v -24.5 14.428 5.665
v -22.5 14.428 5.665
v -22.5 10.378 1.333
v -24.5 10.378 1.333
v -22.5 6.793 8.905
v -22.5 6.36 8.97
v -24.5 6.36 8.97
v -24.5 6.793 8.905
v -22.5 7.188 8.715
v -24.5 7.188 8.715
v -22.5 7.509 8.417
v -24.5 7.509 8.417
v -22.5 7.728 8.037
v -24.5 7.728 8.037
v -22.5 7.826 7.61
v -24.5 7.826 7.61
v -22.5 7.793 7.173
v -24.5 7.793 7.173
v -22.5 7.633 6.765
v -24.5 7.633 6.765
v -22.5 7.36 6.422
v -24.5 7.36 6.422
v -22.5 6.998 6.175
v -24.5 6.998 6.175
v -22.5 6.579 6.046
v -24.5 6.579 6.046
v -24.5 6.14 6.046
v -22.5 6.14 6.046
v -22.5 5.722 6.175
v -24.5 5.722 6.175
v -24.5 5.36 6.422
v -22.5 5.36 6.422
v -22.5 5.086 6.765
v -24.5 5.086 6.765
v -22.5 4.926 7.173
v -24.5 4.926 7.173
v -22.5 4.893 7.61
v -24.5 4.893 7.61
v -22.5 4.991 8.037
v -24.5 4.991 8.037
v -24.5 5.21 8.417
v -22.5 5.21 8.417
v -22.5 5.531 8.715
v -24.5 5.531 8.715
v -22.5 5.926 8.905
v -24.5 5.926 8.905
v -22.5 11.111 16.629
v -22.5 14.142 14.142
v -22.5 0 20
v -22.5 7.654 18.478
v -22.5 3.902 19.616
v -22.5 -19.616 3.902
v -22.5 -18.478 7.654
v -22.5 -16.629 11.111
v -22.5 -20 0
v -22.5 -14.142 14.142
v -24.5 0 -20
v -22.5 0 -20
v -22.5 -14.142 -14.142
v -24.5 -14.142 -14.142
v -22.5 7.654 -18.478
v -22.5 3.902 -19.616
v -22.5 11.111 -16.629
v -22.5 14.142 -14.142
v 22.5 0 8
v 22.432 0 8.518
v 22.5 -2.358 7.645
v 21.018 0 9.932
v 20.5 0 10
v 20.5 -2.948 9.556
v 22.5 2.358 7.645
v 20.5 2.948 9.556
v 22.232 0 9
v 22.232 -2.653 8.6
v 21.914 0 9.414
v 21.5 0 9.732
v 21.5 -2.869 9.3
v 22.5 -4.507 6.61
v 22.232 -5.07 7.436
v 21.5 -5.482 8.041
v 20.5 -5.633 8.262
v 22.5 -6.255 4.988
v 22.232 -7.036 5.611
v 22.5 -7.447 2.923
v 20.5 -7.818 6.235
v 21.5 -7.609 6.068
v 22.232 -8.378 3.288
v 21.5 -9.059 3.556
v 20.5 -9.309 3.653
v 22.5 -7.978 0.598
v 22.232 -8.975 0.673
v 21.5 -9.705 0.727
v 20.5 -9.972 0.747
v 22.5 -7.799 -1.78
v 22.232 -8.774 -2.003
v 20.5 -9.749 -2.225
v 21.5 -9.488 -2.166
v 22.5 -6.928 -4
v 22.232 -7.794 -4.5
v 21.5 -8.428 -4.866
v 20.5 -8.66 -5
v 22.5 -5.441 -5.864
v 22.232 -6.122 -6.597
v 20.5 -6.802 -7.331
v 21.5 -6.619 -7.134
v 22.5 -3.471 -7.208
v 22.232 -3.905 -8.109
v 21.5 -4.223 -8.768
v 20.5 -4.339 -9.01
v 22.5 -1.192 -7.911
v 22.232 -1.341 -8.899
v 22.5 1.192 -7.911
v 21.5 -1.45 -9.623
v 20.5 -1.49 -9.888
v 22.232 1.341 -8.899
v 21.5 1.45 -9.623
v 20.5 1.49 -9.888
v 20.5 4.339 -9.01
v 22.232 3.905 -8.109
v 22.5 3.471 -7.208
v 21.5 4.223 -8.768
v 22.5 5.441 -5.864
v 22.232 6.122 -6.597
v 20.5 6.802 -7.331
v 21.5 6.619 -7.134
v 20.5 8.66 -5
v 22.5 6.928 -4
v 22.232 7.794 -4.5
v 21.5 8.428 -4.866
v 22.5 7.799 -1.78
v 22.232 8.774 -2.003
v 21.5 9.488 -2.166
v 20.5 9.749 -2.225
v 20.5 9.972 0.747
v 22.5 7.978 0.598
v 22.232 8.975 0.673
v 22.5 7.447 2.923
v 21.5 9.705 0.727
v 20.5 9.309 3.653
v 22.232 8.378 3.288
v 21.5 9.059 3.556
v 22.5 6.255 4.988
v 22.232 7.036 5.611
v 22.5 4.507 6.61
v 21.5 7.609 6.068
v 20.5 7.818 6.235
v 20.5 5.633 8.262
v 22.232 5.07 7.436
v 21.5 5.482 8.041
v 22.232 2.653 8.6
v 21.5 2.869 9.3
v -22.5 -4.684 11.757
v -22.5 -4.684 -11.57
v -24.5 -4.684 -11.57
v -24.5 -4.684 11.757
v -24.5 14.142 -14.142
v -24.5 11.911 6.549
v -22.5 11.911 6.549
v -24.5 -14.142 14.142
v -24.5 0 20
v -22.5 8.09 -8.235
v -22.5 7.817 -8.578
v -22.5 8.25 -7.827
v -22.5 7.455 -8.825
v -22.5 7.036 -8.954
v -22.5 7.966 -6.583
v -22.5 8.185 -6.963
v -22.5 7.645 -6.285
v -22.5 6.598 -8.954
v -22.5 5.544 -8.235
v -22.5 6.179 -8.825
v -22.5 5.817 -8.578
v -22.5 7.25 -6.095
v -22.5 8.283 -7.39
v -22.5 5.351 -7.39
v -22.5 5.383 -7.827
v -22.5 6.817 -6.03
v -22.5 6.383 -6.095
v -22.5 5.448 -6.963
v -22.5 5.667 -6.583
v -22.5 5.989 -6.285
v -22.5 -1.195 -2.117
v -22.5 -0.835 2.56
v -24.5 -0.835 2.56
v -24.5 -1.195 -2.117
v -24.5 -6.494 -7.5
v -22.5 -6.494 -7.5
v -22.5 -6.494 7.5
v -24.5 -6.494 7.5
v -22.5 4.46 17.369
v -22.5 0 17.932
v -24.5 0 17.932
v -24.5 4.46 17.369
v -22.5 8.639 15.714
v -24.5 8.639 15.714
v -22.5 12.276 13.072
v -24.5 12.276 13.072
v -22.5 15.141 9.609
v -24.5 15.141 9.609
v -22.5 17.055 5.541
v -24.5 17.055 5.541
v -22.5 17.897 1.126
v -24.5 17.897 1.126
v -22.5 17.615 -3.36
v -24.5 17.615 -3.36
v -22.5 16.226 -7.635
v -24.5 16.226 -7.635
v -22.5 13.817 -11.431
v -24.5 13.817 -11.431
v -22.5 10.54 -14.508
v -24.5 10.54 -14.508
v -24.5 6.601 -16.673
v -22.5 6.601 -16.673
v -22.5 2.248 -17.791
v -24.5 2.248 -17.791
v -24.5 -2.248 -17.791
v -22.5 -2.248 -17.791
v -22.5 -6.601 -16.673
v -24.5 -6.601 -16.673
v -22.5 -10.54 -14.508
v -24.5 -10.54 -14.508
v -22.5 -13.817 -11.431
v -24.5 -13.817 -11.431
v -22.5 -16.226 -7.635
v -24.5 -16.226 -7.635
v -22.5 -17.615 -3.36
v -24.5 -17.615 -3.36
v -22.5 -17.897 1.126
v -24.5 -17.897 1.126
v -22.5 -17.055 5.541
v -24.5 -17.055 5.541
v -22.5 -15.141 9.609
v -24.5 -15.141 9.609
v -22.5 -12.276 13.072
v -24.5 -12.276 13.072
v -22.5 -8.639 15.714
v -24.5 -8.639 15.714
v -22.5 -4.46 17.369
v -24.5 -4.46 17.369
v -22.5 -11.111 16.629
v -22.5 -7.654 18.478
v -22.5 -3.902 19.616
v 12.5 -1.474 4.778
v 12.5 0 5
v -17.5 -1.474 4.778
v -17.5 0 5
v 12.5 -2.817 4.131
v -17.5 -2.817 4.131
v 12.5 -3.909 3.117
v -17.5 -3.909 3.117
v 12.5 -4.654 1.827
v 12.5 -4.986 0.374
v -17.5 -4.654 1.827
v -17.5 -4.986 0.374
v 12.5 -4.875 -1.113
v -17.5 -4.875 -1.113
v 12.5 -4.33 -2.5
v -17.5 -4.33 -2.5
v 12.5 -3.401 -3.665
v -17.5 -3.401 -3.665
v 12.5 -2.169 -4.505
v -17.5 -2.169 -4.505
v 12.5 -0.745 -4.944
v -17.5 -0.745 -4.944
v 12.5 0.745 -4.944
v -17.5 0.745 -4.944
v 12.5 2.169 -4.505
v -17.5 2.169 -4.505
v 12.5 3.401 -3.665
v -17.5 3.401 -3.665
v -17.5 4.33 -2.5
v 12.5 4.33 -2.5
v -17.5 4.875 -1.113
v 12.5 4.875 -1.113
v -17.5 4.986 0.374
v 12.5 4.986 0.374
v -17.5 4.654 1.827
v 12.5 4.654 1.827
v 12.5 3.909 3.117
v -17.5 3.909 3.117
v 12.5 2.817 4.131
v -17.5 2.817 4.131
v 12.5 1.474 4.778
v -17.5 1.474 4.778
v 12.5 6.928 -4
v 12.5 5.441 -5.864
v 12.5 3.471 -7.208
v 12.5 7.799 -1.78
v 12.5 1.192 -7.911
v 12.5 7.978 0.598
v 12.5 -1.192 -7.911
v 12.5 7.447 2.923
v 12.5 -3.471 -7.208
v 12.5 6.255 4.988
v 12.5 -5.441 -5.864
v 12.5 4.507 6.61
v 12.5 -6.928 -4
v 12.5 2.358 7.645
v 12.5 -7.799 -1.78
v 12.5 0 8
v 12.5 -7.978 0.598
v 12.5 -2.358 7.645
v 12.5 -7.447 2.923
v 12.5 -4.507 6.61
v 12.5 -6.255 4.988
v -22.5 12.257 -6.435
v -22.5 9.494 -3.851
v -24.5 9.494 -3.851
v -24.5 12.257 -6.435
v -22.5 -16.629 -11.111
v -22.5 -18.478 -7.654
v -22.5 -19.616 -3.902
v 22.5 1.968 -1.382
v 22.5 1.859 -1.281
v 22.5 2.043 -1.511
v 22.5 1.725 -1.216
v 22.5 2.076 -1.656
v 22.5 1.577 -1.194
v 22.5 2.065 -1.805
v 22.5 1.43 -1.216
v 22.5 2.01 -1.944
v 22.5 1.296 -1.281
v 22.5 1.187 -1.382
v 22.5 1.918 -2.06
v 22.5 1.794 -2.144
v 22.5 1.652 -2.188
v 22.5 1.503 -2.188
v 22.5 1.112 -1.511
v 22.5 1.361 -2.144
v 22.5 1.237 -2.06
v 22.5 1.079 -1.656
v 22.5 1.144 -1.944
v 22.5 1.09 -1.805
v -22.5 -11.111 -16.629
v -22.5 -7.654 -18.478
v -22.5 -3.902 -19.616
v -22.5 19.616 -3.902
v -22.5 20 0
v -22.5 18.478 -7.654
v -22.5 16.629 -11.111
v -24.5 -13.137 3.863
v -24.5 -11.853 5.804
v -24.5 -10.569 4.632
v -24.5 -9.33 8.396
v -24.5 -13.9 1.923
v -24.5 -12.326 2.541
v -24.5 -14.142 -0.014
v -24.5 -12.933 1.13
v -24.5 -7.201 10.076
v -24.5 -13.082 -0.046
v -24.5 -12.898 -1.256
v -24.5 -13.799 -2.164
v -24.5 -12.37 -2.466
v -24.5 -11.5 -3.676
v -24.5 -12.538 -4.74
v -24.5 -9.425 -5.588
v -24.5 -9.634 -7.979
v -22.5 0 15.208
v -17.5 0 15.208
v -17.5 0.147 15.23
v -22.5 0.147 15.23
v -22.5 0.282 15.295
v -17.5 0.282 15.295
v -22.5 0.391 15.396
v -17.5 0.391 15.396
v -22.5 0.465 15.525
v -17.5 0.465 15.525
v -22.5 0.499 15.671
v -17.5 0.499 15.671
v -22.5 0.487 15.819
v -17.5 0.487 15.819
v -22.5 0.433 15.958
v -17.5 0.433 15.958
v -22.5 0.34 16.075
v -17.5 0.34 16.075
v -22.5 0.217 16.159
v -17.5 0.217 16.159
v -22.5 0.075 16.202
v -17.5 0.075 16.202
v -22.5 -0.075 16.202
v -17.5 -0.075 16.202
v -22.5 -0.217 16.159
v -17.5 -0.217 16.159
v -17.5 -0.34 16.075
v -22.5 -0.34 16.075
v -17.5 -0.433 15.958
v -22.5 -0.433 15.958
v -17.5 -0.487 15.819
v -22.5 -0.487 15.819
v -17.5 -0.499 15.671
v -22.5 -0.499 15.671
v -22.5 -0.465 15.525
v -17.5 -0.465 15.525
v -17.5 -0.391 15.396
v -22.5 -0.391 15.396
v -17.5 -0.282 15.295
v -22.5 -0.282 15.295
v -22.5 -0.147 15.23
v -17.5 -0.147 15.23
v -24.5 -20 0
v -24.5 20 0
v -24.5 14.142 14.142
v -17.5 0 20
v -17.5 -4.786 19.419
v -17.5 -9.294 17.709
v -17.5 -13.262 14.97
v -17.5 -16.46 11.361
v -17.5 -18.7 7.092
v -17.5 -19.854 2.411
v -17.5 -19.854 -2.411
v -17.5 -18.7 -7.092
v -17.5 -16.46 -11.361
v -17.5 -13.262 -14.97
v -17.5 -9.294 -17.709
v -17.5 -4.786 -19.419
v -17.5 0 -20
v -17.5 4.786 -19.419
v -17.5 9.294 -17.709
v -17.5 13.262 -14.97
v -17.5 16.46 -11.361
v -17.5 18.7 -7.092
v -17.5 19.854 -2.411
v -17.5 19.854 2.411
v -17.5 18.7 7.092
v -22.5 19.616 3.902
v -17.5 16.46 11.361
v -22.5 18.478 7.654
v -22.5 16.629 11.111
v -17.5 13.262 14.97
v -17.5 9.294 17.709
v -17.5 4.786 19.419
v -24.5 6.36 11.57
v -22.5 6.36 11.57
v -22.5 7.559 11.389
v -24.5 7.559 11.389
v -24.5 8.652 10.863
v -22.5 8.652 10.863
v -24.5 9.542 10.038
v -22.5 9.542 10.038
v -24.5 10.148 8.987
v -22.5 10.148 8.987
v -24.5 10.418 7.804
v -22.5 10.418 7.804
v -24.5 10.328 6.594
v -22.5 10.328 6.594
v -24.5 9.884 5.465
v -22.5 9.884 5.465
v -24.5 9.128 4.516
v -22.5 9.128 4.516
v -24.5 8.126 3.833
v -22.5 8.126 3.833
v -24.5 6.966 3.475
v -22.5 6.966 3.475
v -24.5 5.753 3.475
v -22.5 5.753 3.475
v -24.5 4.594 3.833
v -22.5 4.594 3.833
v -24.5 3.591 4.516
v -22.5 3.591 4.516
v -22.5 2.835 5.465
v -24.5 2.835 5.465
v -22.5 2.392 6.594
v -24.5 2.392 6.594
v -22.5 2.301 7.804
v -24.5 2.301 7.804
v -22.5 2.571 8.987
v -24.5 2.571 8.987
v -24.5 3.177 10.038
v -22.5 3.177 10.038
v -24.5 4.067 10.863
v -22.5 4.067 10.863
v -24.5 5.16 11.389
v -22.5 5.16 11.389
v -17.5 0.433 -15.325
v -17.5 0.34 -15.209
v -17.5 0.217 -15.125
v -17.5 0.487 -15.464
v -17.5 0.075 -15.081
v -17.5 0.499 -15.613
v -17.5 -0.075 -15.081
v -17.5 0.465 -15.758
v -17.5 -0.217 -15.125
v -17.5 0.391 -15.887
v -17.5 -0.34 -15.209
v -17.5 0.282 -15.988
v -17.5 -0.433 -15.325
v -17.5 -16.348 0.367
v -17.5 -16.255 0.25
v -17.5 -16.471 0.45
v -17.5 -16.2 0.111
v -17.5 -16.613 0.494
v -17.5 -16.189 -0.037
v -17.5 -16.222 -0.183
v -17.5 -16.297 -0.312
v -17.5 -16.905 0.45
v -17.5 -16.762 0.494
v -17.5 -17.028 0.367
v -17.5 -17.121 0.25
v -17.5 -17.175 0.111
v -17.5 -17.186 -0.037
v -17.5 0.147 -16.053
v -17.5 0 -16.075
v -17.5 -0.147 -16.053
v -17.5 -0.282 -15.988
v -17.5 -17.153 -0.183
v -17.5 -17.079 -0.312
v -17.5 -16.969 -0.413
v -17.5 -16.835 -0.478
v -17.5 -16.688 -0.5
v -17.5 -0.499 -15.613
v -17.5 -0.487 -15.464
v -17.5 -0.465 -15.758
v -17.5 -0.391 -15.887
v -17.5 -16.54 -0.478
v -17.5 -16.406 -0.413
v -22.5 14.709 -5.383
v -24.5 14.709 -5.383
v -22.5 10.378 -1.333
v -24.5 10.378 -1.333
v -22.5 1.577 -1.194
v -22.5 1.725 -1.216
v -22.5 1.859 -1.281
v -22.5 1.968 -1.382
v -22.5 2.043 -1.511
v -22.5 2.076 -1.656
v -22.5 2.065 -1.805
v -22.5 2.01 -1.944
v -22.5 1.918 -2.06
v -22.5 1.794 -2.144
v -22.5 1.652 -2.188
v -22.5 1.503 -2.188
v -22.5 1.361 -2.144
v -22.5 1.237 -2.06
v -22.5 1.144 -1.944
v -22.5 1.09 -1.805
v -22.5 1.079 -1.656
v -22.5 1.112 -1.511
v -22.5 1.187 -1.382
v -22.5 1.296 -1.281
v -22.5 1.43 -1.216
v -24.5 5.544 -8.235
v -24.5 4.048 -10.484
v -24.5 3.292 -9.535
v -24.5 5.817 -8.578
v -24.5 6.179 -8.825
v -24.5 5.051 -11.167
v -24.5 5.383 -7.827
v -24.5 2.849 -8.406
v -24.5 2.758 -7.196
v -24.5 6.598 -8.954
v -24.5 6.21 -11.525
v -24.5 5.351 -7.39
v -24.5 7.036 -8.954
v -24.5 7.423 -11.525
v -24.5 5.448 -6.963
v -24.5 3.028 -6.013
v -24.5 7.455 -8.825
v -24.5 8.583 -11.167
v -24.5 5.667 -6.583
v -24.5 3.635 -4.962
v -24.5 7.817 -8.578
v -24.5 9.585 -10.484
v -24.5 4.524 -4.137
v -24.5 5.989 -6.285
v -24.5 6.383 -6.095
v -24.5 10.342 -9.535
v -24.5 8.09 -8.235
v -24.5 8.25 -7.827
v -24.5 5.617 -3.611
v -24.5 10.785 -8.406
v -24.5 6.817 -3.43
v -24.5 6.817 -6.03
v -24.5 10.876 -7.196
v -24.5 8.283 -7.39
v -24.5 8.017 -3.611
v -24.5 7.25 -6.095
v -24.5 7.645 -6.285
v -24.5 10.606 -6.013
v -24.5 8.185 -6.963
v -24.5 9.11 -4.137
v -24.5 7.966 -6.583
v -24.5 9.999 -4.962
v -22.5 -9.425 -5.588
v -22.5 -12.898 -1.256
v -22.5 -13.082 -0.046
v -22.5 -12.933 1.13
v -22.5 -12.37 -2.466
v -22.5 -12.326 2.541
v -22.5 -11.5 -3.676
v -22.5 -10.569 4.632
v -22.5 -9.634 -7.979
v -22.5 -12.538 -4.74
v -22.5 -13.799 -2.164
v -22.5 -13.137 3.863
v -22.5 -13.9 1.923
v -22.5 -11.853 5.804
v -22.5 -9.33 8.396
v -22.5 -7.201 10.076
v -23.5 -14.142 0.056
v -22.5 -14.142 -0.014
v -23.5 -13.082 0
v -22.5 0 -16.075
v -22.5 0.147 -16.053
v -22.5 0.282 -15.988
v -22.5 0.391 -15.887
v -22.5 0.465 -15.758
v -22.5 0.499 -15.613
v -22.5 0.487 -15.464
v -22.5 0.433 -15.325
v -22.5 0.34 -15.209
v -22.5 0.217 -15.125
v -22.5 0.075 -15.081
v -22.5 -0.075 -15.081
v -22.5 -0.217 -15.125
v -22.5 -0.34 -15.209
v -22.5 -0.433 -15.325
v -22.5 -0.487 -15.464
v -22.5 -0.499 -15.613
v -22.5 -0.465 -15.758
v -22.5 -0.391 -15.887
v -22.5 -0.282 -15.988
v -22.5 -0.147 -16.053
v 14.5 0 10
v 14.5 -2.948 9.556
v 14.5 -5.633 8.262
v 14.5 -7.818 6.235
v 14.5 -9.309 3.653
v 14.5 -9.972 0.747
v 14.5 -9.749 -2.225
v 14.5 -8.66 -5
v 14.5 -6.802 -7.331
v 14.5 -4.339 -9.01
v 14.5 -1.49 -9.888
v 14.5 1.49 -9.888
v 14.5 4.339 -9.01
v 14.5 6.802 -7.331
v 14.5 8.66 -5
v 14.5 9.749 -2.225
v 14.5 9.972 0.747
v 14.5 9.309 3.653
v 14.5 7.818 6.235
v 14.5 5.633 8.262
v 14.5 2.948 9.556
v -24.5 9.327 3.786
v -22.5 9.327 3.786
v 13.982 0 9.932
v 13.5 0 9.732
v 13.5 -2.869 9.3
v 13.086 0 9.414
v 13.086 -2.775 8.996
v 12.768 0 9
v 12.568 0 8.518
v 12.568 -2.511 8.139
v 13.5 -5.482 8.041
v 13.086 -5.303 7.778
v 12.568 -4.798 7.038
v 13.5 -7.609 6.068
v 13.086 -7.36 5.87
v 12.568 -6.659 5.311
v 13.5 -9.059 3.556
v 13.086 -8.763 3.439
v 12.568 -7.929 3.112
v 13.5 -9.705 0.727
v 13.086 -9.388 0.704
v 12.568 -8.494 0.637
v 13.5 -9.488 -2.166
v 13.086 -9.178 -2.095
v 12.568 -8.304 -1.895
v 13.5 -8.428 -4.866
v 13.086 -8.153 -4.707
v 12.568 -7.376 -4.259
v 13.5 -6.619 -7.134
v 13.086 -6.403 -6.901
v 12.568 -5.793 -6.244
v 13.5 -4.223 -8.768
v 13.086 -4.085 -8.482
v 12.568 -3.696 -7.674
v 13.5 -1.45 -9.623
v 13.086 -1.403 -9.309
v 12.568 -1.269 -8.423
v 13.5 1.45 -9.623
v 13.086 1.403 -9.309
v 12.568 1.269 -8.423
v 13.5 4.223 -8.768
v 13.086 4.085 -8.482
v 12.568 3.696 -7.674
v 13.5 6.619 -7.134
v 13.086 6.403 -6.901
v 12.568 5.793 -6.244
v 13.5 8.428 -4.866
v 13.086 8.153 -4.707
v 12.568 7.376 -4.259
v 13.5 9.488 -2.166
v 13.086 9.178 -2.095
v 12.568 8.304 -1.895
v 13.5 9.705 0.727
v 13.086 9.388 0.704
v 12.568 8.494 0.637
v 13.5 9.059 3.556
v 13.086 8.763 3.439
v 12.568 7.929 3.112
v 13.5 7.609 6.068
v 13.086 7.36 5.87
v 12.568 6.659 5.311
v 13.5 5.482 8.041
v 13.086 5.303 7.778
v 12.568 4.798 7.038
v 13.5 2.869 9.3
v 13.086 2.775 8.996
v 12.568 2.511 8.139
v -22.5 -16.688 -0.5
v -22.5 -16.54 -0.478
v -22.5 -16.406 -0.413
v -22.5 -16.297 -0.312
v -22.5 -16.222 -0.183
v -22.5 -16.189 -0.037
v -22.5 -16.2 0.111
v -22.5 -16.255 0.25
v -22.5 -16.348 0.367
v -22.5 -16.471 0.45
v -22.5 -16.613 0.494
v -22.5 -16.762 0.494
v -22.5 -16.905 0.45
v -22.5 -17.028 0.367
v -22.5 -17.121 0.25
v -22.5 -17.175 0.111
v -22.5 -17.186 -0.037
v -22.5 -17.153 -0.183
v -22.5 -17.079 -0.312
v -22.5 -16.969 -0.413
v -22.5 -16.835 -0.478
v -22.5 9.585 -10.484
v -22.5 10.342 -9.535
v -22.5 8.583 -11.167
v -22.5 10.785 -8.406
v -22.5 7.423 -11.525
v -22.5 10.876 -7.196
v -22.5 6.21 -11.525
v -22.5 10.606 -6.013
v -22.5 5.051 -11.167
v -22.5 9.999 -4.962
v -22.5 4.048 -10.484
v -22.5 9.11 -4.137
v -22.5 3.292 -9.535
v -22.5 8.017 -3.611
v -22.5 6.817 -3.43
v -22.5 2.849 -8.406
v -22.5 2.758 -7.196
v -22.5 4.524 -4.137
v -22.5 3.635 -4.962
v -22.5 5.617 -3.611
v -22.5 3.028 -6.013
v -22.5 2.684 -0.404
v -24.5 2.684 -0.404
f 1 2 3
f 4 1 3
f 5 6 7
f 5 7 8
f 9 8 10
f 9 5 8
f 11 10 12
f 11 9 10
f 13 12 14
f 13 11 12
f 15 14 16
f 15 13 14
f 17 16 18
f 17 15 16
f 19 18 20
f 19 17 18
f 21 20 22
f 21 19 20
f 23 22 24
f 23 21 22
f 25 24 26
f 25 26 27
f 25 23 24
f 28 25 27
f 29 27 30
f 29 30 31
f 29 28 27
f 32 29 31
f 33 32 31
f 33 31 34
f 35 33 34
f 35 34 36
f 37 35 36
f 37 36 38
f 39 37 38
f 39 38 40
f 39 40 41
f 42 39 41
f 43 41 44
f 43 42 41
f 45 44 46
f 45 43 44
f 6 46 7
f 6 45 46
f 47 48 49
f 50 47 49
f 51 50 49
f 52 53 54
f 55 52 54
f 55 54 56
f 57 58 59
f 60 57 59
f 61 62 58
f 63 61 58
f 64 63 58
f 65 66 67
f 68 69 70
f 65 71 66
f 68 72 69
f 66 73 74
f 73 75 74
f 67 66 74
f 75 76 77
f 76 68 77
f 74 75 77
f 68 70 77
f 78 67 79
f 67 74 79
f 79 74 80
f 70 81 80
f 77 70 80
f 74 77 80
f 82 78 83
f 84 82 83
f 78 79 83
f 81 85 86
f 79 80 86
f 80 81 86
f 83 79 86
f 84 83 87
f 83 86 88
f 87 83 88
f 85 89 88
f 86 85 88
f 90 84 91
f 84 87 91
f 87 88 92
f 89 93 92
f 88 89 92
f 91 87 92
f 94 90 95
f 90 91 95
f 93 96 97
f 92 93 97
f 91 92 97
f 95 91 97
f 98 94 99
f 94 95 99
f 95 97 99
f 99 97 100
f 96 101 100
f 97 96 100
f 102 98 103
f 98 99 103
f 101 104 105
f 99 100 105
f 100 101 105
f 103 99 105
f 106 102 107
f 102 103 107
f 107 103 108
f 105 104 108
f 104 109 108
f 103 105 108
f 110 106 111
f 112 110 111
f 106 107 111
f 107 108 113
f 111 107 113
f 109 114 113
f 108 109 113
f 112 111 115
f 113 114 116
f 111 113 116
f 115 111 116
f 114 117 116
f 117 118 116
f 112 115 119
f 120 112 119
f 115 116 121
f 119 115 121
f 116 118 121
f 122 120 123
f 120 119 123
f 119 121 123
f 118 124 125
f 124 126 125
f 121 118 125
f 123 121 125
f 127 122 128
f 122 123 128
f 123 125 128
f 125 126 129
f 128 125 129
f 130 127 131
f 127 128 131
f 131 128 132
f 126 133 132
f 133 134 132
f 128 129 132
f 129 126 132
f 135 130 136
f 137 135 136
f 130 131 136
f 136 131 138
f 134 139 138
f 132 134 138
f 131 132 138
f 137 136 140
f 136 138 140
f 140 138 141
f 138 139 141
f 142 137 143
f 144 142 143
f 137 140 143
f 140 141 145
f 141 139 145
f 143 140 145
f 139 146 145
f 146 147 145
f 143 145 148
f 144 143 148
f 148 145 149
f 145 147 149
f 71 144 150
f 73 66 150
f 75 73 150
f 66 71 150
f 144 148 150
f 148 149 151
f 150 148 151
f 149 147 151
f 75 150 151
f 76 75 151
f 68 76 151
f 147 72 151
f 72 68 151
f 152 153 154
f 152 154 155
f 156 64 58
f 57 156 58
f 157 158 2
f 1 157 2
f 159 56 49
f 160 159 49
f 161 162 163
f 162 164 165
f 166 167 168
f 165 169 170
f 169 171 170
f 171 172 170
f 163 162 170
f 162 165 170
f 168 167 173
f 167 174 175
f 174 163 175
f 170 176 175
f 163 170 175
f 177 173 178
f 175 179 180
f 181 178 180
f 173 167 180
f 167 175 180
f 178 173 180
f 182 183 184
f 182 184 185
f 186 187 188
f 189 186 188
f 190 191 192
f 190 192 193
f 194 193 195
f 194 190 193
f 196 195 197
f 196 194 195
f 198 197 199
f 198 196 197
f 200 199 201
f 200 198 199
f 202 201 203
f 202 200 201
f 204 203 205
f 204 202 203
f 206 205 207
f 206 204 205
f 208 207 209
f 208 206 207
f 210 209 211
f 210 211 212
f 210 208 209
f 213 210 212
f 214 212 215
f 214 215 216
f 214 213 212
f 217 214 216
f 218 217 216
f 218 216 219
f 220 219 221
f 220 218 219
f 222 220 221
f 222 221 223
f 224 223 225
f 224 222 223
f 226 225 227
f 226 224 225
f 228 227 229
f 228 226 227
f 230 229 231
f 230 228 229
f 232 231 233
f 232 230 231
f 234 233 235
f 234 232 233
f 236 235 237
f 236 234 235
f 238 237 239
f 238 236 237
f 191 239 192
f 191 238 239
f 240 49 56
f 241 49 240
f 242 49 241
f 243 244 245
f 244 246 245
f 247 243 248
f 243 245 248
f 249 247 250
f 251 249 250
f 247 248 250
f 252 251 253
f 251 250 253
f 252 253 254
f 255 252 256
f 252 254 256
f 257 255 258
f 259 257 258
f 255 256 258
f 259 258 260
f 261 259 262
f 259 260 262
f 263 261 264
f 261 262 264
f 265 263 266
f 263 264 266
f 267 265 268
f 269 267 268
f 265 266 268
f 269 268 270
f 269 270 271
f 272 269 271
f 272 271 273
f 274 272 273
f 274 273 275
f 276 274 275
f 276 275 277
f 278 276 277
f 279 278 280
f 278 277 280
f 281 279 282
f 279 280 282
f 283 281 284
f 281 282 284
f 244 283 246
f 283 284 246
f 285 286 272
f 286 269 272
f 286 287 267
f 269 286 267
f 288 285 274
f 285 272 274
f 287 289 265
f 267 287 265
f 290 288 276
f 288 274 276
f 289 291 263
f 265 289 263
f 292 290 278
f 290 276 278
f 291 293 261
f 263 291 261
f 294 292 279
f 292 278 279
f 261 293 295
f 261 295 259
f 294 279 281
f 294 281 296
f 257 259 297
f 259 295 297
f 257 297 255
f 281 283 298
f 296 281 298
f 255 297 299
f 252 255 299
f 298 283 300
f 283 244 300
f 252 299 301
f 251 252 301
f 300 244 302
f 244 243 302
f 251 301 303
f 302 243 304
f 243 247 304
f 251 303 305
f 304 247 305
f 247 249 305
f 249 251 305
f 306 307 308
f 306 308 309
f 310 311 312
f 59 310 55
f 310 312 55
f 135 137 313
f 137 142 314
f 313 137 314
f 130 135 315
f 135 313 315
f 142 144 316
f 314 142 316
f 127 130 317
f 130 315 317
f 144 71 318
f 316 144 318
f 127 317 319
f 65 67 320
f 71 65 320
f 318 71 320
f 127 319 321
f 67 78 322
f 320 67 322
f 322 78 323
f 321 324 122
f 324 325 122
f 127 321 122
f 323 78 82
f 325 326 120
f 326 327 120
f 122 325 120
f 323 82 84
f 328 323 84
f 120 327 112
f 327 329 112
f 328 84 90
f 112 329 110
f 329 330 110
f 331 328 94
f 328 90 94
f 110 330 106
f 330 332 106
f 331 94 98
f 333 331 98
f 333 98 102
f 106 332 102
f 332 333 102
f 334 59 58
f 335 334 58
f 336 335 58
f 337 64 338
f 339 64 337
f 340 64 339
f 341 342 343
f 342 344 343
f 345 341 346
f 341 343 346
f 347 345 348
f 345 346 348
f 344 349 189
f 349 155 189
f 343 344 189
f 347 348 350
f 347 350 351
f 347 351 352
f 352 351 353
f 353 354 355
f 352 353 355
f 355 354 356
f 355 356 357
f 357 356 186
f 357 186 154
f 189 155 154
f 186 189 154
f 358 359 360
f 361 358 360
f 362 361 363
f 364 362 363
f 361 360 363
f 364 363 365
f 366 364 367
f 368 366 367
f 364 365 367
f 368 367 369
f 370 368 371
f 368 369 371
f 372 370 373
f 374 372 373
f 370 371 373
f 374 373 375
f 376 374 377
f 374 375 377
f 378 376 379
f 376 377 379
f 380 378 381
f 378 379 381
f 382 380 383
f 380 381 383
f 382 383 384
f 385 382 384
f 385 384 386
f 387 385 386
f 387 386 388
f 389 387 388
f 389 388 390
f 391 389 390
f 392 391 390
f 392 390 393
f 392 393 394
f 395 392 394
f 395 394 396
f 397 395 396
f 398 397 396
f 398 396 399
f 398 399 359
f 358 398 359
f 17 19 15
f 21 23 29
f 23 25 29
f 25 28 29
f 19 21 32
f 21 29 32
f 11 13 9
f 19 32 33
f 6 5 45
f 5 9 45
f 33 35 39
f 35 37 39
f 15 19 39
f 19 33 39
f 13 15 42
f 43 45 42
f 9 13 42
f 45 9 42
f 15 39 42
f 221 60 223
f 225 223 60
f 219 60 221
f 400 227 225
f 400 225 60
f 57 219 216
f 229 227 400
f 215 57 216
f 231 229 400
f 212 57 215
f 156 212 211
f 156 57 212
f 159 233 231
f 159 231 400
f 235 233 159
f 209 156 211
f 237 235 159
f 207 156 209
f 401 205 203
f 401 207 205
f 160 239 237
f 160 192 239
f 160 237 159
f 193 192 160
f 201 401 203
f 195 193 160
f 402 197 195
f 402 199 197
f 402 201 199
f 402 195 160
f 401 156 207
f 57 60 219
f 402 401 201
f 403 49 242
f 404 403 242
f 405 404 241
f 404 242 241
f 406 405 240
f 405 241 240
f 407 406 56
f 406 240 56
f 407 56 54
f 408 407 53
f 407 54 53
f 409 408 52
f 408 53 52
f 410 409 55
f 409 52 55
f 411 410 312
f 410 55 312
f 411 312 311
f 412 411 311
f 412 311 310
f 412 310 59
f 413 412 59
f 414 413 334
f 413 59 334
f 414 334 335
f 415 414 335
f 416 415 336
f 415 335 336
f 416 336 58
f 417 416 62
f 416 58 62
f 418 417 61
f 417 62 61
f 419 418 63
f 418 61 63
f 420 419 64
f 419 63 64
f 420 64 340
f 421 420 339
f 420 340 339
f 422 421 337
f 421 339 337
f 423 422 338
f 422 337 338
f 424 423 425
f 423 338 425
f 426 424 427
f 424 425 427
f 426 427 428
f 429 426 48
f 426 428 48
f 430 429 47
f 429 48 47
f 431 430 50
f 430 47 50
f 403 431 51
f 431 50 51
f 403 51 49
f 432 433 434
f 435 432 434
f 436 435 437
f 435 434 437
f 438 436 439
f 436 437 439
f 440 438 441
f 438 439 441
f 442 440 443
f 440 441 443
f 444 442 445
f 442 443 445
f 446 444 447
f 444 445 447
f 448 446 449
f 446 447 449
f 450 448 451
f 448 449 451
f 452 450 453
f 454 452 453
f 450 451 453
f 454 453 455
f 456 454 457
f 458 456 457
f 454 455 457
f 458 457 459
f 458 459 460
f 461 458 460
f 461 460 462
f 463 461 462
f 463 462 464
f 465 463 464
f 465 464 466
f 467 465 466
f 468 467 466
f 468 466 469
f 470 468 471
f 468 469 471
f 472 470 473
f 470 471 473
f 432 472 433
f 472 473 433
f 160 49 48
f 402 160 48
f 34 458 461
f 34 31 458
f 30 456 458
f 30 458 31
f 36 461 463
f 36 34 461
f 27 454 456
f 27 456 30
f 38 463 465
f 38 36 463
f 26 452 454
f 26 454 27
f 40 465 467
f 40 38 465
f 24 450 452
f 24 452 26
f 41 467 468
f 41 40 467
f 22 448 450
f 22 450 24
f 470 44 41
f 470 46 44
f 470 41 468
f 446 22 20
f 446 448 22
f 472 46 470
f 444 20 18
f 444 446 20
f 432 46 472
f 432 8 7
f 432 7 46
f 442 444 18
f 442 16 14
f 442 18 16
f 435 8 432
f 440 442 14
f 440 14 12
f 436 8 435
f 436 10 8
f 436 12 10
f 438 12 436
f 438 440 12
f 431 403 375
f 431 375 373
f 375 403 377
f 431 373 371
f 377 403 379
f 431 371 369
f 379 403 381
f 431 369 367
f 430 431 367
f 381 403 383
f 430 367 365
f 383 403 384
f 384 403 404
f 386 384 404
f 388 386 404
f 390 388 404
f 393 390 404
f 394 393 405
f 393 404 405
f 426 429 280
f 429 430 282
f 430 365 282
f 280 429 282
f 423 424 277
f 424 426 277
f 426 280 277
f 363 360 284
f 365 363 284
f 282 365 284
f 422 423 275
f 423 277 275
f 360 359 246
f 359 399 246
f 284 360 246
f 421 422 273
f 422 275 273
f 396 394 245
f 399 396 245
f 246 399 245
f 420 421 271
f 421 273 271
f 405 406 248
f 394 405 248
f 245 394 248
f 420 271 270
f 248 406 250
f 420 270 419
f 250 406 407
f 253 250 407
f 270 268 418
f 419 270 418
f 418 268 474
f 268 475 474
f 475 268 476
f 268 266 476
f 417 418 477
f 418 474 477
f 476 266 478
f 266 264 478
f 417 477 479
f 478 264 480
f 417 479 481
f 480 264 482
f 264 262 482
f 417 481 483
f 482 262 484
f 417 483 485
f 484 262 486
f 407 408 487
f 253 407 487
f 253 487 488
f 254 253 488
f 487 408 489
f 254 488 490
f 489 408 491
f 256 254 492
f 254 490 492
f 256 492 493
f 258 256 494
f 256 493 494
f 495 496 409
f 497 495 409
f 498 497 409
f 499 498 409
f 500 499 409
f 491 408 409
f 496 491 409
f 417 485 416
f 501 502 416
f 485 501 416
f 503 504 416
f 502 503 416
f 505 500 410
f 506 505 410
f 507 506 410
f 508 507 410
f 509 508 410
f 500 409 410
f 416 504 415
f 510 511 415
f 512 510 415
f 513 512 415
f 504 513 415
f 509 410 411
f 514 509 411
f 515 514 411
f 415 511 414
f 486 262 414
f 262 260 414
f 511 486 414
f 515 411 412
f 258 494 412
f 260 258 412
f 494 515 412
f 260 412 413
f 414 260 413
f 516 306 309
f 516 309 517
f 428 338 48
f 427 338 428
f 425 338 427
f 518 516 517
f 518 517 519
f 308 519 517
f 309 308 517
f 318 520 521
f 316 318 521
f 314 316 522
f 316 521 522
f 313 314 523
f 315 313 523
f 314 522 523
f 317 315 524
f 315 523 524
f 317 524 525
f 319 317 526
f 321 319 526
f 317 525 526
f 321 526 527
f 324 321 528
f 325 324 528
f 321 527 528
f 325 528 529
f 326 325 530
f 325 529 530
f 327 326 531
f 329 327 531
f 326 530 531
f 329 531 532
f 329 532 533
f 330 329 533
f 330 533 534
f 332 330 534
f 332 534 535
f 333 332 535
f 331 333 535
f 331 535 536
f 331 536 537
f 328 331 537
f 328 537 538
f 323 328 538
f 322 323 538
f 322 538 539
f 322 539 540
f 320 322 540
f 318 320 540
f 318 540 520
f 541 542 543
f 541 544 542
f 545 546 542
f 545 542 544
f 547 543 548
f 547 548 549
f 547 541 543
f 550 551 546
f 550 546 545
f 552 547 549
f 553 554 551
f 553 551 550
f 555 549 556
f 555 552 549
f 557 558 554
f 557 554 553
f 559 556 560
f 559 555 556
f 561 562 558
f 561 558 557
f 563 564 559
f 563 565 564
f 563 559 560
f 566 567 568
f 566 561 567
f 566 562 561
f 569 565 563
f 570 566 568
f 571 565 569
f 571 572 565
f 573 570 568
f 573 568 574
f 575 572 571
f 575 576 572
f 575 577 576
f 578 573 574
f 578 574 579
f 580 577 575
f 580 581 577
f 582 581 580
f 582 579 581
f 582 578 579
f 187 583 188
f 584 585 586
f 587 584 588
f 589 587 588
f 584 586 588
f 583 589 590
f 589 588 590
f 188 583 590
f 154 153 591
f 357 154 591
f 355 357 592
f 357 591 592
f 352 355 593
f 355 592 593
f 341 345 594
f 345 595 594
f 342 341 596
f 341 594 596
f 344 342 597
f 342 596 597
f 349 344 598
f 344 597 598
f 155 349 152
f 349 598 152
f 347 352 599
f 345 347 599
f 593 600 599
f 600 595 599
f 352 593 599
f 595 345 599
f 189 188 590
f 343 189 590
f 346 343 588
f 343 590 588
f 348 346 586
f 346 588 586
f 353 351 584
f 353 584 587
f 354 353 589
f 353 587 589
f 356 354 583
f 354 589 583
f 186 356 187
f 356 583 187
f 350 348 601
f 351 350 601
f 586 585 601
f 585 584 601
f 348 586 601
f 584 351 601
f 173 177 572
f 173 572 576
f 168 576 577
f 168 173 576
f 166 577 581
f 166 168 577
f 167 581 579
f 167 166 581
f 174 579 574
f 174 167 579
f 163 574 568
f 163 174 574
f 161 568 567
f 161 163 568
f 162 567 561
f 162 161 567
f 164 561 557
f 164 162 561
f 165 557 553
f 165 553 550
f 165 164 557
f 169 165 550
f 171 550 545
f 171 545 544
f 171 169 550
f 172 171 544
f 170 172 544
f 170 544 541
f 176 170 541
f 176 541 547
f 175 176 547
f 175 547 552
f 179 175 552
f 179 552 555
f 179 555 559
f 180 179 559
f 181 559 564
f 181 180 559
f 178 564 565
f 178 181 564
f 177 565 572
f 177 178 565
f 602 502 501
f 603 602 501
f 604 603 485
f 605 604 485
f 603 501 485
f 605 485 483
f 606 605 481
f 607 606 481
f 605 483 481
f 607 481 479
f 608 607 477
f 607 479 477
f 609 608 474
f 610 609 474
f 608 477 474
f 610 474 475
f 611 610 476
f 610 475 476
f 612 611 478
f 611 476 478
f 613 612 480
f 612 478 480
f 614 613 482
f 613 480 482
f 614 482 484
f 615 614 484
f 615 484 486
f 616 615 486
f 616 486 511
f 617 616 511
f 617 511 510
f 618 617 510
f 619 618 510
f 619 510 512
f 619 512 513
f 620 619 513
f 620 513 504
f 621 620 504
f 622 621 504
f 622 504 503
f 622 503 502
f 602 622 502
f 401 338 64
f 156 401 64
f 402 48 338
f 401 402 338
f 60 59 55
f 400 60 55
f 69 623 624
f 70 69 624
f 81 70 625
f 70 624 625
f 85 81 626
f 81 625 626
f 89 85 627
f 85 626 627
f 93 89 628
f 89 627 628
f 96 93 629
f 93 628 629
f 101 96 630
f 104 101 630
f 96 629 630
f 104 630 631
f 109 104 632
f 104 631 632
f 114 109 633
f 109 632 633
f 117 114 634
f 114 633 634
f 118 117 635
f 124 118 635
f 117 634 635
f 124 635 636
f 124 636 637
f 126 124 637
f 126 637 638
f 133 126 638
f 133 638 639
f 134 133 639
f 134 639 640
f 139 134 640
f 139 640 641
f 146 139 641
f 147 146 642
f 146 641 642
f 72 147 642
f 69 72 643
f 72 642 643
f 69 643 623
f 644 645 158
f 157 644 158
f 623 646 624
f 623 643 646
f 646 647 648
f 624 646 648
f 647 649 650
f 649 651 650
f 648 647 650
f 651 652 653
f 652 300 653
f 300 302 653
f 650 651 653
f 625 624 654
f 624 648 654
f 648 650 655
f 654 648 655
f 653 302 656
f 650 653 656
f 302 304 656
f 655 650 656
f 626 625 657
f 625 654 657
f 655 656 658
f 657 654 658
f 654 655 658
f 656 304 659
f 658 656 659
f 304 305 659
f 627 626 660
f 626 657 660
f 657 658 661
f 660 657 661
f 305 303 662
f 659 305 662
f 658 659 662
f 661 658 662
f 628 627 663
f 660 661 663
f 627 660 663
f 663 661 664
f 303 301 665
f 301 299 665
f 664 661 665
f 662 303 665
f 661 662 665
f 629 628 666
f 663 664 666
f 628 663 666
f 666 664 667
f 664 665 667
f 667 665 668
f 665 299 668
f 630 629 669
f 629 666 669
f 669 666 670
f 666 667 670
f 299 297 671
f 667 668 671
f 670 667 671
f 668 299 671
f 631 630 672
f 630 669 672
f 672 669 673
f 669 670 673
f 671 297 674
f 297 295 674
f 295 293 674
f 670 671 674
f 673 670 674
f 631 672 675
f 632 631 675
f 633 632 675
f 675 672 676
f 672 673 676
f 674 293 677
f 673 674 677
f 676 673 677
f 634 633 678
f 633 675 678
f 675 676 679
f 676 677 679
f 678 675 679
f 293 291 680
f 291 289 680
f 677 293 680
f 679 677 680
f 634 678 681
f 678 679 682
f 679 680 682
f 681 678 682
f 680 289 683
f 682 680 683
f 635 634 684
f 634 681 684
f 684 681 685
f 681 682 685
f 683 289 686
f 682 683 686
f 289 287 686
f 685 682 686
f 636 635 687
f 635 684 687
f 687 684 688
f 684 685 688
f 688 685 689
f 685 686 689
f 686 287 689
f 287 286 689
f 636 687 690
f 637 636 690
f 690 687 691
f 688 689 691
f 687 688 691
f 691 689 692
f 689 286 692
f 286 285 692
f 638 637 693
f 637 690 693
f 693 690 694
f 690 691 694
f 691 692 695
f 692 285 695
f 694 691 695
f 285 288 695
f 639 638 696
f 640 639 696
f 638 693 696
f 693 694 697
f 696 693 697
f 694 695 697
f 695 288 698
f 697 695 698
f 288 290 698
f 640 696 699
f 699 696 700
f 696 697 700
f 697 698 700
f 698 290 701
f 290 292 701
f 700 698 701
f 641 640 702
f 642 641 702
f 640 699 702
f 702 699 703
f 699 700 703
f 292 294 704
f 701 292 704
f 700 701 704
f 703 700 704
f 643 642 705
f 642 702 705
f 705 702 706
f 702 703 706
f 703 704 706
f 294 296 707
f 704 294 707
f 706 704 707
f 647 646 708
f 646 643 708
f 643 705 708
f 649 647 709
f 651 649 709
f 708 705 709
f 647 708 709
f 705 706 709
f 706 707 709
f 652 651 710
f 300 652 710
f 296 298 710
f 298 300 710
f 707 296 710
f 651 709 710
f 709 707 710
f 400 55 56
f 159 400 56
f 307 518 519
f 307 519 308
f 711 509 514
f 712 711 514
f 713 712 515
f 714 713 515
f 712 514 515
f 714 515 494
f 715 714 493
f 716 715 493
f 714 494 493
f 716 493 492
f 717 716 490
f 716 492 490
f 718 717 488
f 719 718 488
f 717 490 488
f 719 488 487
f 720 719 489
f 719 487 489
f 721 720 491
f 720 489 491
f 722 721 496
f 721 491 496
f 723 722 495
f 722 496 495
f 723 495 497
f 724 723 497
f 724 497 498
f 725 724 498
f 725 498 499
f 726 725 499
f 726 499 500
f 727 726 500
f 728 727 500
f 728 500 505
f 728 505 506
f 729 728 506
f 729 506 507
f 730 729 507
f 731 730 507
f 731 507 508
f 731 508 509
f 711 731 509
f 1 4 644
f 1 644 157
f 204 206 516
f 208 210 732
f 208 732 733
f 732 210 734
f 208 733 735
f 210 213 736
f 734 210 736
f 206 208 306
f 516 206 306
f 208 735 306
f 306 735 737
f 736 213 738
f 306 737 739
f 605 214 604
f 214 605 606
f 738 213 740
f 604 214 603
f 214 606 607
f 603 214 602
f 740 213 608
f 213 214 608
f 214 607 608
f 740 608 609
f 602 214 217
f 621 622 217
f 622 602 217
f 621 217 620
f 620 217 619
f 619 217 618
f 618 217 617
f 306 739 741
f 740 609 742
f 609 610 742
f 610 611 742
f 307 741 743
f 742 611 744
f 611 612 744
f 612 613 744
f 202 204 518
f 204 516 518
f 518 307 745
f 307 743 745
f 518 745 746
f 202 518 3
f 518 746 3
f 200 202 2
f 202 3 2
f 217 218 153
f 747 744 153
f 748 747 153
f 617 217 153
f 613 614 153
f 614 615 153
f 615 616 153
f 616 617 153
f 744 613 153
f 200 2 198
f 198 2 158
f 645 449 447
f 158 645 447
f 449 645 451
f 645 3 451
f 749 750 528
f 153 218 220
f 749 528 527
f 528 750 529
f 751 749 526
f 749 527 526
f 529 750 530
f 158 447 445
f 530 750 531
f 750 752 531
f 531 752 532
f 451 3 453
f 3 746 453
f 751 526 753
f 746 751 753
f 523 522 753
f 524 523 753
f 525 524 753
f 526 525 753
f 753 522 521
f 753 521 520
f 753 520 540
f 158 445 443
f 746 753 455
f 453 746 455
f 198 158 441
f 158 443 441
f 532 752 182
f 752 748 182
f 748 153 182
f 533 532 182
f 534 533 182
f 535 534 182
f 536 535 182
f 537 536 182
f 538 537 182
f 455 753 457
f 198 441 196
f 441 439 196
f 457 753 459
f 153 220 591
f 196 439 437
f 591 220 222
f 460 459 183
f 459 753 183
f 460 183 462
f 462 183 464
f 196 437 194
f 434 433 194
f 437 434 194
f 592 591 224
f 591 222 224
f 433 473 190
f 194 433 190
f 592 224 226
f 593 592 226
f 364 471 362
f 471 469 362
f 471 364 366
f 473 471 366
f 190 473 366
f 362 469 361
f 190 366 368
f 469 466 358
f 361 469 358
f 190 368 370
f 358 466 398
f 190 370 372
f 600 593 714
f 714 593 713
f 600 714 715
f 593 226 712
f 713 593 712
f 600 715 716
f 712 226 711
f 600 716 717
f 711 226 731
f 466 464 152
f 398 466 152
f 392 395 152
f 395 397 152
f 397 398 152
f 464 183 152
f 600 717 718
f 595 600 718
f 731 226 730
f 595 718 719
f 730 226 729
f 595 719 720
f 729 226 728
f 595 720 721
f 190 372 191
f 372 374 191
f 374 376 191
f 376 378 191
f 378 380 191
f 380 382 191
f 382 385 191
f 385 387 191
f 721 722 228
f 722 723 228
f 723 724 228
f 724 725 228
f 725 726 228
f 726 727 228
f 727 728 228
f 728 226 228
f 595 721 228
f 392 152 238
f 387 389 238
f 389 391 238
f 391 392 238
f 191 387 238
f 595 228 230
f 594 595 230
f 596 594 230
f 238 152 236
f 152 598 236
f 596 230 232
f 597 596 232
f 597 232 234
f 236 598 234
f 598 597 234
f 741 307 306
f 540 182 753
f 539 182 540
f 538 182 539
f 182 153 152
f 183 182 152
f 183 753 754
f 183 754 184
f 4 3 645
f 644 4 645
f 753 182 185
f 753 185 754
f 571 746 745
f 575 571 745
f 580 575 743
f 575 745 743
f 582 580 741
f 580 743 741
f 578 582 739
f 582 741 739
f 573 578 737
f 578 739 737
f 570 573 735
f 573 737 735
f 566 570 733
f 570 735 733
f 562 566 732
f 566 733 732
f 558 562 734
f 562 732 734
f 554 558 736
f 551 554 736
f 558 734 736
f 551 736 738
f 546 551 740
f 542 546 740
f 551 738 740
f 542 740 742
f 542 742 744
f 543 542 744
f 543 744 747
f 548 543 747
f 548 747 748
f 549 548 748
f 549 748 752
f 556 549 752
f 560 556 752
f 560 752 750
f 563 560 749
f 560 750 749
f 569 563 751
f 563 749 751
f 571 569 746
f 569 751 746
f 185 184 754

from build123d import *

# Parameters (mm, degrees)
FILLET7_R             = 2
FILLET8_R             = 2
SKETCH2_R             = 17.932362589
SKETCH2_R_2           = 4.070139316
SKETCH2_R_3           = 1.470244109
BOSS_EXTRUDE4_DEPTH   = 2
F_1_0MM_DOWEL_HOLE1_D = 1
F_1_0MM_DOWEL_HOLE3_D = 1


with BuildPart() as part:
    # Sketch1 → Revolve2 (revolve)
    with BuildSketch(Plane.XY, mode=Mode.PRIVATE) as revolve2_sk:
        Polygon((-22.5, 0), (22.5, 0), (22.5, 5), (22.5, 10), (12.5, 10), (12.5, 5), (-17.5, 5), (-17.5, 20), (-22.5, 20), align=None)
    revolve(revolve2_sk.sketch.rotate(Axis((-22.5, 0, 0), (1, 0, 0)), 90), axis=Axis((-22.5, 0, 0), (1, 0, 0)))

    # Fillet7
    fillet7_edges = [part.edges().sort_by_distance(p)[0] for p in [
        (22.5, 0, -10),
    ]]
    fillet(fillet7_edges, radius=FILLET7_R)

    # Fillet8
    fillet8_edges = [part.edges().sort_by_distance(p)[0] for p in [
        (12.5, 0, -10),
    ]]
    fillet(fillet8_edges, radius=FILLET8_R)

    # Sketch2 → Boss-Extrude4 (add)
    # profile 1 of 7: a face of its own
    with BuildSketch(Plane.ZY.offset(22.5)):
        Polygon((0, 20), (-14.142135624, 14.142135624), (-20, 0), (-14.142135624, -14.142135624), (0, -20), (14.142135624, -14.142135624), (20, 0), (14.142135624, 14.142135624), align=None)
        Circle(SKETCH2_R, mode=Mode.SUBTRACT)
    # profile 2 of 7: a face of its own
    with BuildSketch(Plane.ZY.offset(22.5)):
        with Locations((7.5, 6.359605711)):
            Circle(SKETCH2_R_2)
        with Locations((7.5, 6.359605711)):
            Circle(SKETCH2_R_3, mode=Mode.SUBTRACT)
    # profile 3 of 7: a face of its own
    with BuildSketch(Plane.ZY.offset(22.5)):
        with Locations((-7.5, 6.816829323)):
            Circle(SKETCH2_R_2)
        with Locations((-7.5, 6.816829323)):
            Circle(SKETCH2_R_3, mode=Mode.SUBTRACT)
    # profile 4 of 7: a face of its own
    with BuildSketch(Plane.ZY.offset(22.5)):
        Polygon((-5.383481764, 14.709120363), (-1.33333, 10.377946656), (-3.850746579, 9.493506516), (-6.434561549, 12.256600867), align=None)
    # profile 5 of 7: a face of its own
    with BuildSketch(Plane.ZY.offset(22.5)):
        with BuildLine():
            Line((-11.570139316, -4.68431352), (11.757283774, -4.68431352))
            add(Edge.make_bspline(
                [(-11.570139316, -4.68431352), (0.019330621, -23.600400847), (11.757283774, -4.68431352)],
                knots=[0, 0, 0, 1, 1, 1], degree=2))
        make_face()
        with BuildLine():
            Line((-7.5, -6.493557604), (7.5, -6.493557604))
            add(Edge.make_bspline(
                [(7.5, -6.493557604), (0, -19.67127169), (-7.5, -6.493557604)],
                knots=[0, 0, 0, 1, 1, 1], degree=2))
        make_face(mode=Mode.SUBTRACT)
    # profile 6 of 7: a face of its own
    with BuildSketch(Plane.ZY.offset(22.5)):
        Polygon((5.664503708, 14.42809842), (1.33333, 10.377946656), (3.785849496, 9.326866872), (6.548943848, 11.910681841), align=None)
    # profile 7 of 7: a face of its own
    with BuildSketch(Plane.ZY.offset(22.5)):
        Polygon((-0.404292244, 2.684485233), (2.559752906, -0.834695524), (-2.116560108, -1.19469663), align=None)
    extrude(amount=BOSS_EXTRUDE4_DEPTH)

    # Ø1.0mm Dowel Hole1 (through all)
    with Locations(Plane(origin=(22.5, 0, 0), x_dir=(0, 0, -1), z_dir=(1, 0, 0))):
        with Locations((1.693680894, 1.577447892)):
            Hole(F_1_0MM_DOWEL_HOLE1_D / 2)

    # Ø1.0mm Dowel Hole3 (through all)
    with Locations(Plane.ZY.offset(22.5)):
        with Locations((15.708060058, 0), (-15.575222341, 0), (0, -16.687738223)):
            Hole(F_1_0MM_DOWEL_HOLE3_D / 2)


solid = part.part
